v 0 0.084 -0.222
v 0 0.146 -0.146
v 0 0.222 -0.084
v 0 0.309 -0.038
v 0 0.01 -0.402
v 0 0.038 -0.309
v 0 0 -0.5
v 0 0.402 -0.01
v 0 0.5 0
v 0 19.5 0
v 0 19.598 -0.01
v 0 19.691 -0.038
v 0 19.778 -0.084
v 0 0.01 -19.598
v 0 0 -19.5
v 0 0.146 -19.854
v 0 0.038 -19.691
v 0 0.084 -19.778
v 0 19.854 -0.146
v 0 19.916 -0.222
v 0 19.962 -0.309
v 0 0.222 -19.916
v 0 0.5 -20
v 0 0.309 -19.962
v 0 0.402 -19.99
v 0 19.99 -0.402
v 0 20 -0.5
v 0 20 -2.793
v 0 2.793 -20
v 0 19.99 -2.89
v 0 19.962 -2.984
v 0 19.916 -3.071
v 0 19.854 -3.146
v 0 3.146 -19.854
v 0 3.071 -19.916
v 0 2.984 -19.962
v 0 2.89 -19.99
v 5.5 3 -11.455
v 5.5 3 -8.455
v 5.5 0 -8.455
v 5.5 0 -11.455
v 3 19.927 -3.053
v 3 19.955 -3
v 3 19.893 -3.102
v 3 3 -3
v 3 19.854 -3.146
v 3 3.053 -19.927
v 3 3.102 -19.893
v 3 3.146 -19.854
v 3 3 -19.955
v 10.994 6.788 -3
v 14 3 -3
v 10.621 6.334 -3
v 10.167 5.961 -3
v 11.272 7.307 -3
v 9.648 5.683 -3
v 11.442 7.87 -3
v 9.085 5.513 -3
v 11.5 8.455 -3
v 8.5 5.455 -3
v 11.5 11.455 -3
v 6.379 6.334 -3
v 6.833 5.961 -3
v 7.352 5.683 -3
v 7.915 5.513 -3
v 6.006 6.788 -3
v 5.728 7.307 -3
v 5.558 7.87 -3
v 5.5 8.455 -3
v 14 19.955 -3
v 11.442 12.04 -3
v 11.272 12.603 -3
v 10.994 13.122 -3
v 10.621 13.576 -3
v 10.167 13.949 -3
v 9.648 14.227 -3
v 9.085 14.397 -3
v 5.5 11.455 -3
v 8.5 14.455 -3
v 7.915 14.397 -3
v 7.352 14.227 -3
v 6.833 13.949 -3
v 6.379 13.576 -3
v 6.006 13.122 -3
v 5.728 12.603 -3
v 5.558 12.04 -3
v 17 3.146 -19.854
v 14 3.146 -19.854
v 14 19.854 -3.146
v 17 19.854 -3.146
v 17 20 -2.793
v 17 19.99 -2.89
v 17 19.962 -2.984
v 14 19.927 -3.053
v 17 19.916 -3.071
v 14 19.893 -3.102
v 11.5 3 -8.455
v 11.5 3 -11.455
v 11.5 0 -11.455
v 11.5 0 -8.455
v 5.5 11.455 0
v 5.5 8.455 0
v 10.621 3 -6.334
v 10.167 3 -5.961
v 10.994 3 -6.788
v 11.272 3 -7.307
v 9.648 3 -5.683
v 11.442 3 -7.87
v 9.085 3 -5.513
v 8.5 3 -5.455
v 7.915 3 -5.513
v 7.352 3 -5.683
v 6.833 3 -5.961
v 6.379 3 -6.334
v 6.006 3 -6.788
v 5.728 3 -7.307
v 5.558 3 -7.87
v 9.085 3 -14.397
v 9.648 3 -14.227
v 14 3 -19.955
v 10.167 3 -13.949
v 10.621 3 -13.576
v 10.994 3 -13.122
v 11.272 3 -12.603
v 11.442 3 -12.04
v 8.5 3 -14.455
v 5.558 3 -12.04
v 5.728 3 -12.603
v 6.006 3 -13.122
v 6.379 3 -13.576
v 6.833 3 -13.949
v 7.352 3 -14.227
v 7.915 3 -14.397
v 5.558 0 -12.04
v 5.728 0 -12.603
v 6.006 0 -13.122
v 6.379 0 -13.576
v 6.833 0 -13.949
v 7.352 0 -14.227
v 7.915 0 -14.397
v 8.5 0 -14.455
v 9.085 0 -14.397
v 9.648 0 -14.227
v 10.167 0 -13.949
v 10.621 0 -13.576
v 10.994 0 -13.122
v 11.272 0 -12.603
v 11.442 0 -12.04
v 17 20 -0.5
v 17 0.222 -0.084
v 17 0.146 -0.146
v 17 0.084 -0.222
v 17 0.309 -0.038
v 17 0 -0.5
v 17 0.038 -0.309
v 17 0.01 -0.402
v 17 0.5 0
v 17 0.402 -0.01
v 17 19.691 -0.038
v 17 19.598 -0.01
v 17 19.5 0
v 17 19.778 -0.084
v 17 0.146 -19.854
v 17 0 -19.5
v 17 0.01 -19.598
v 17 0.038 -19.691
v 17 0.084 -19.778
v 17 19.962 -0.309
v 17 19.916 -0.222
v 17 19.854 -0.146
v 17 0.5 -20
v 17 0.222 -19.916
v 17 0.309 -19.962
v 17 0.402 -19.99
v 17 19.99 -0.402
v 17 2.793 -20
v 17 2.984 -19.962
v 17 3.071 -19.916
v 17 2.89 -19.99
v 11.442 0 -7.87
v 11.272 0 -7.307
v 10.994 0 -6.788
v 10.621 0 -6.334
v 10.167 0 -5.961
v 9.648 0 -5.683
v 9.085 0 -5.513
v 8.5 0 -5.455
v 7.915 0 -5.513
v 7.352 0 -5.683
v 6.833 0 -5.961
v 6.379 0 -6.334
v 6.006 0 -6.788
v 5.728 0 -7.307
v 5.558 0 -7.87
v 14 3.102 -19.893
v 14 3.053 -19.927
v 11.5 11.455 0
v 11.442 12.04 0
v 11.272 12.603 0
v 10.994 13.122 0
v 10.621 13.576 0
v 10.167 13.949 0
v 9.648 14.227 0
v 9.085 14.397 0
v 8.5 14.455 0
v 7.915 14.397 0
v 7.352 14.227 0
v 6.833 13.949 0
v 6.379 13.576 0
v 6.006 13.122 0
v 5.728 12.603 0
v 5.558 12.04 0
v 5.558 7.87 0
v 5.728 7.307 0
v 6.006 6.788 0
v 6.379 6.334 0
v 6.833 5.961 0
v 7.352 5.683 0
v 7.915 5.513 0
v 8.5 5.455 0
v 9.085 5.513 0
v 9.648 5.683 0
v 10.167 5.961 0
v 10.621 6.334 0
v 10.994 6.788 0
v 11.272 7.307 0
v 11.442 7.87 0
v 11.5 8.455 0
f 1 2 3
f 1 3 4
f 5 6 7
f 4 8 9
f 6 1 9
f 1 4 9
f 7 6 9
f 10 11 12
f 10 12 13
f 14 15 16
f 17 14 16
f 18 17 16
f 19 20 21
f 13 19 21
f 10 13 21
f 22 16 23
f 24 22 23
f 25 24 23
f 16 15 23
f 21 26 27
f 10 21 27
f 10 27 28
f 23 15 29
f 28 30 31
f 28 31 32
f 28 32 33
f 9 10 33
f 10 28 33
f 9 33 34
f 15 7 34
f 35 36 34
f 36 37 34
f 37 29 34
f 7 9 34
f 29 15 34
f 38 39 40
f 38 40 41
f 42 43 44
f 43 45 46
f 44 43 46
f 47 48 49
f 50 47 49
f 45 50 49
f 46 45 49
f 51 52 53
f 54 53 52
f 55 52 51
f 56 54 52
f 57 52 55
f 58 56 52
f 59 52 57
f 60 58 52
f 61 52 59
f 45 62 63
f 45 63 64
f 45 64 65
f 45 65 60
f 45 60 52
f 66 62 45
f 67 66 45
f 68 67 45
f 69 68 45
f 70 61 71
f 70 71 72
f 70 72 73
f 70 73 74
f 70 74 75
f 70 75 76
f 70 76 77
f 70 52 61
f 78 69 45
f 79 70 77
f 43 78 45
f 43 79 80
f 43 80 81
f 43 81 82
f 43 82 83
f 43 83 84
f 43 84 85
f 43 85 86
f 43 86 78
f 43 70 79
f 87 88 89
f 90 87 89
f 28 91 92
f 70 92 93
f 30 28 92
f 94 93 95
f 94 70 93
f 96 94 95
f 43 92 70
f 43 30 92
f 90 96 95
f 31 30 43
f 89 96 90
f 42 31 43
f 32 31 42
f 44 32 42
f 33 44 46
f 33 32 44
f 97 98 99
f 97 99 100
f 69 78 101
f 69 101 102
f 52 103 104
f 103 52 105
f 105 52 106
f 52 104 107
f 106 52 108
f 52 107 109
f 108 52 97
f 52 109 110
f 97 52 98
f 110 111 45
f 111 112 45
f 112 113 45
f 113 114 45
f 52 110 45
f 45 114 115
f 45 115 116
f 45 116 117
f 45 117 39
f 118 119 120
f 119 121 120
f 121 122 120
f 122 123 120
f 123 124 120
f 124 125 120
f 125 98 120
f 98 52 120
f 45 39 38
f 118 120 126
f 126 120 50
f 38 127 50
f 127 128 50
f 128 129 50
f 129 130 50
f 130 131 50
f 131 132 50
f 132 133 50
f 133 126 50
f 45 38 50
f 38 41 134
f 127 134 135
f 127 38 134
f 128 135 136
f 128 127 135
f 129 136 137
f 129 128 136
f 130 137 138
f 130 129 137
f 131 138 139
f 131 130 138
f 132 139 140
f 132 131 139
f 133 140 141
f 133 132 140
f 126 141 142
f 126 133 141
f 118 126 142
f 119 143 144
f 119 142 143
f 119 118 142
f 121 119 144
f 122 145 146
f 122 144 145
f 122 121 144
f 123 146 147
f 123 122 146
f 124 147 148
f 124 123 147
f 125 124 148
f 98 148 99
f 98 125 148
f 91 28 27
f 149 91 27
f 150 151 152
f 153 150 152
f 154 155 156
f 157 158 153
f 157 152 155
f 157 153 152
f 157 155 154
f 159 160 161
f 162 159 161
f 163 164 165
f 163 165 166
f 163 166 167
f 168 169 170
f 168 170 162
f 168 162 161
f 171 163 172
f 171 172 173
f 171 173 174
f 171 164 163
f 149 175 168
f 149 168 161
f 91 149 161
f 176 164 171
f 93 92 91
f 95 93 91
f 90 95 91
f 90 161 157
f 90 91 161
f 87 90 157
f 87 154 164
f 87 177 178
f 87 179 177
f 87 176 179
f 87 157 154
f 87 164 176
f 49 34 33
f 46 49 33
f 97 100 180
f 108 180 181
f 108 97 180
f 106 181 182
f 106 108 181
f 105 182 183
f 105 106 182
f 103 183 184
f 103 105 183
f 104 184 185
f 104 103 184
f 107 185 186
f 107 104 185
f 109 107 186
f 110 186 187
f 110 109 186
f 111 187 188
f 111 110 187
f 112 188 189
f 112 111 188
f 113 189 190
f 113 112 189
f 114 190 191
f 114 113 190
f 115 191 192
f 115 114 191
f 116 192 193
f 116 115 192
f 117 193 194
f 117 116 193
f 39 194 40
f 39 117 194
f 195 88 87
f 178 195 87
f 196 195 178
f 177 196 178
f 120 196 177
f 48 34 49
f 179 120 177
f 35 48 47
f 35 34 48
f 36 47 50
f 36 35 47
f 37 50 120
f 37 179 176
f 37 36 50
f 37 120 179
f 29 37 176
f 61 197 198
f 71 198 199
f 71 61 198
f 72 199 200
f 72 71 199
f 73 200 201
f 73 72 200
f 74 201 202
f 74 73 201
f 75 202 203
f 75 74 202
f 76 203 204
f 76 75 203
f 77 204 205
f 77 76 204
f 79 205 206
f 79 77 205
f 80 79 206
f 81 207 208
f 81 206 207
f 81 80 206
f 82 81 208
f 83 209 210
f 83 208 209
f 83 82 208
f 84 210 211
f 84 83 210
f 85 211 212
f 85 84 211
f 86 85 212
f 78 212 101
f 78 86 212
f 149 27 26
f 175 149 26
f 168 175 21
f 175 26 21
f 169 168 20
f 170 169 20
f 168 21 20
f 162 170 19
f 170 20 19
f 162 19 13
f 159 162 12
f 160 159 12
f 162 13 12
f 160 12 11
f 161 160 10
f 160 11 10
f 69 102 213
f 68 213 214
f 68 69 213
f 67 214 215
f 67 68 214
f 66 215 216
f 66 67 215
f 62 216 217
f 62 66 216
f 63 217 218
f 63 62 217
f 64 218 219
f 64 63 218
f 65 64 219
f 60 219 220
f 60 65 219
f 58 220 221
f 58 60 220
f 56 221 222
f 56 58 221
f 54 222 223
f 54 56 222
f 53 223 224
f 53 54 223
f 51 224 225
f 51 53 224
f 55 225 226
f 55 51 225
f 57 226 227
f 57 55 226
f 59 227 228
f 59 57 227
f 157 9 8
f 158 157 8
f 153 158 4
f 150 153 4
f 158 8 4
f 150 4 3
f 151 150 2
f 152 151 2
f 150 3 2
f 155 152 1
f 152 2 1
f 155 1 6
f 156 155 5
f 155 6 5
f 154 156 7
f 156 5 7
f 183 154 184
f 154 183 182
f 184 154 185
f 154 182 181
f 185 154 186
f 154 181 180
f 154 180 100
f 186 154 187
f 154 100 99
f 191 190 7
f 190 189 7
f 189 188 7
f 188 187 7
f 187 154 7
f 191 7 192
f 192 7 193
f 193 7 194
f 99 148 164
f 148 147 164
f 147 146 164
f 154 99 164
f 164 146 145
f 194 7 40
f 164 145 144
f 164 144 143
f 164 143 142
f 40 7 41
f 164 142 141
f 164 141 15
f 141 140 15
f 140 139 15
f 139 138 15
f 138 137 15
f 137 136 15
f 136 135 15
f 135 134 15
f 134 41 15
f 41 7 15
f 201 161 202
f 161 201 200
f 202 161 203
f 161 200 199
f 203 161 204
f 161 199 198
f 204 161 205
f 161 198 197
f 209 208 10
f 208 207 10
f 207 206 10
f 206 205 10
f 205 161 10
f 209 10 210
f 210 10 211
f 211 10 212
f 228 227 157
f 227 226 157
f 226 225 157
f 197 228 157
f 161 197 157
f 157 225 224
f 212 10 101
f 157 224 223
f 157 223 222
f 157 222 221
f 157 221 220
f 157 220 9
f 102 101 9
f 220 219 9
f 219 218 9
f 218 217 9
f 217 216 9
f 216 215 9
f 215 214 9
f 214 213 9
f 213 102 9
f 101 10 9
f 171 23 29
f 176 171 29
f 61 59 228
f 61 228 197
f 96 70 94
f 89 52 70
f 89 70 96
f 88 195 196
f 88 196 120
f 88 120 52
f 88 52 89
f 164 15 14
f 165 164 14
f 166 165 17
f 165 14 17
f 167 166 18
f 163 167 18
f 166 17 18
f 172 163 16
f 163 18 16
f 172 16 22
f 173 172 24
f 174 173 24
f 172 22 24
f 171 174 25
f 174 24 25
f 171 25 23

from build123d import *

# Parameters (mm, degrees)
ESTRUSIONE_ESTRUSIONE1_DEPTH = 17
SCHIZZO4_W                   = 11
SCHIZZO4_H                   = 17
TAGLIO_ESTRUSIONE3_DEPTH     = 17
RACCORDO3_START              = -1
RACCORDO3_DEPTH              = 19
TAGLIO_ESTRUSIONE4_DEPTH     = 32.272991542
TAGLIO_ESTRUSIONE5_DEPTH     = 32.272991542


with BuildPart() as part:
    # Schizzo1 → Estrusione-Estrusione1 (new body)
    with BuildSketch(Plane(origin=(0, 0, 0), x_dir=(0, 0, -1), z_dir=(1, 0, 0))):
        with BuildLine():
            Line((0, 19.5), (0, 0.5))
            ThreePointArc((0, 0.5), (0.146446609, 0.146446609), (0.5, 0))
            Line((0.5, 0), (19.5, 0))
            ThreePointArc((19.5, 0), (19.853553391, 0.146446609), (20, 0.5))
            Line((20, 0.5), (20, 3))
            Line((20, 3), (3, 20))
            Line((3, 20), (0.5, 20))
            ThreePointArc((0.5, 20), (0.146446609, 19.853553391), (0, 19.5))
        make_face()
    extrude(amount=ESTRUSIONE_ESTRUSIONE1_DEPTH)

    # Schizzo4 → Taglio-Estrusione3 (cut)
    with BuildSketch(Plane(origin=(0, 0, -20), x_dir=(-1, 0, 0), z_dir=(0, 0, -1))):
        with Locations((-8.5, 11.5)):
            Rectangle(SCHIZZO4_W, SCHIZZO4_H)
    extrude(amount=-TAGLIO_ESTRUSIONE3_DEPTH, mode=Mode.SUBTRACT)

    # Raccordo3: read off the stored shape, not the designer's step
    # Raccordo3 outline → Raccordo3 (cut)
    with BuildSketch(Plane.YZ.offset(RACCORDO3_START)):
        with BuildLine():
            Line((3, -20), (3.146446609, -19.853553391))
            ThreePointArc((3.146446609, -19.853553391), (2.984234935, -19.961939766), (2.792893219, -20))
            Line((2.792893219, -20), (3, -20))
        make_face()
        with BuildLine():
            Line((19.853553391, -3.146446609), (20, -3))
            Line((20, -3), (20, -2.792893219))
            ThreePointArc((20, -2.792893219), (19.961939766, -2.984234935), (19.853553391, -3.146446609))
        make_face()
    extrude(amount=RACCORDO3_DEPTH, mode=Mode.SUBTRACT)

    # Schizzo5 → Taglio-Estrusione4 (cut, through all)
    with BuildSketch(Plane(origin=(0, 3, 0), x_dir=(1, 0, 0), z_dir=(0, 1, 0))):
        with BuildLine():
            Line((11.5, 11.455089861), (11.5, 8.455089861))
            ThreePointArc((11.5, 8.455089861), (8.5, 5.455089861), (5.5, 8.455089861))
            Line((5.5, 8.455089861), (5.5, 11.455089861))
            ThreePointArc((5.5, 11.455089861), (8.5, 14.455089861), (11.5, 11.455089861))
        make_face()
    extrude(amount=-TAGLIO_ESTRUSIONE4_DEPTH, mode=Mode.SUBTRACT)

    # Schizzo6 → Taglio-Estrusione5 (cut, through all)
    with BuildSketch(Plane(origin=(0, 0, -3), x_dir=(-1, 0, 0), z_dir=(0, 0, -1))):
        with BuildLine():
            Line((-5.5, 11.455089861), (-5.5, 8.455089861))
            ThreePointArc((-5.5, 8.455089861), (-8.5, 5.455089861), (-11.5, 8.455089861))
            Line((-11.5, 8.455089861), (-11.5, 11.455089861))
            ThreePointArc((-11.5, 11.455089861), (-8.5, 14.455089861), (-5.5, 11.455089861))
        make_face()
    extrude(amount=-TAGLIO_ESTRUSIONE5_DEPTH, mode=Mode.SUBTRACT)


solid = part.part
